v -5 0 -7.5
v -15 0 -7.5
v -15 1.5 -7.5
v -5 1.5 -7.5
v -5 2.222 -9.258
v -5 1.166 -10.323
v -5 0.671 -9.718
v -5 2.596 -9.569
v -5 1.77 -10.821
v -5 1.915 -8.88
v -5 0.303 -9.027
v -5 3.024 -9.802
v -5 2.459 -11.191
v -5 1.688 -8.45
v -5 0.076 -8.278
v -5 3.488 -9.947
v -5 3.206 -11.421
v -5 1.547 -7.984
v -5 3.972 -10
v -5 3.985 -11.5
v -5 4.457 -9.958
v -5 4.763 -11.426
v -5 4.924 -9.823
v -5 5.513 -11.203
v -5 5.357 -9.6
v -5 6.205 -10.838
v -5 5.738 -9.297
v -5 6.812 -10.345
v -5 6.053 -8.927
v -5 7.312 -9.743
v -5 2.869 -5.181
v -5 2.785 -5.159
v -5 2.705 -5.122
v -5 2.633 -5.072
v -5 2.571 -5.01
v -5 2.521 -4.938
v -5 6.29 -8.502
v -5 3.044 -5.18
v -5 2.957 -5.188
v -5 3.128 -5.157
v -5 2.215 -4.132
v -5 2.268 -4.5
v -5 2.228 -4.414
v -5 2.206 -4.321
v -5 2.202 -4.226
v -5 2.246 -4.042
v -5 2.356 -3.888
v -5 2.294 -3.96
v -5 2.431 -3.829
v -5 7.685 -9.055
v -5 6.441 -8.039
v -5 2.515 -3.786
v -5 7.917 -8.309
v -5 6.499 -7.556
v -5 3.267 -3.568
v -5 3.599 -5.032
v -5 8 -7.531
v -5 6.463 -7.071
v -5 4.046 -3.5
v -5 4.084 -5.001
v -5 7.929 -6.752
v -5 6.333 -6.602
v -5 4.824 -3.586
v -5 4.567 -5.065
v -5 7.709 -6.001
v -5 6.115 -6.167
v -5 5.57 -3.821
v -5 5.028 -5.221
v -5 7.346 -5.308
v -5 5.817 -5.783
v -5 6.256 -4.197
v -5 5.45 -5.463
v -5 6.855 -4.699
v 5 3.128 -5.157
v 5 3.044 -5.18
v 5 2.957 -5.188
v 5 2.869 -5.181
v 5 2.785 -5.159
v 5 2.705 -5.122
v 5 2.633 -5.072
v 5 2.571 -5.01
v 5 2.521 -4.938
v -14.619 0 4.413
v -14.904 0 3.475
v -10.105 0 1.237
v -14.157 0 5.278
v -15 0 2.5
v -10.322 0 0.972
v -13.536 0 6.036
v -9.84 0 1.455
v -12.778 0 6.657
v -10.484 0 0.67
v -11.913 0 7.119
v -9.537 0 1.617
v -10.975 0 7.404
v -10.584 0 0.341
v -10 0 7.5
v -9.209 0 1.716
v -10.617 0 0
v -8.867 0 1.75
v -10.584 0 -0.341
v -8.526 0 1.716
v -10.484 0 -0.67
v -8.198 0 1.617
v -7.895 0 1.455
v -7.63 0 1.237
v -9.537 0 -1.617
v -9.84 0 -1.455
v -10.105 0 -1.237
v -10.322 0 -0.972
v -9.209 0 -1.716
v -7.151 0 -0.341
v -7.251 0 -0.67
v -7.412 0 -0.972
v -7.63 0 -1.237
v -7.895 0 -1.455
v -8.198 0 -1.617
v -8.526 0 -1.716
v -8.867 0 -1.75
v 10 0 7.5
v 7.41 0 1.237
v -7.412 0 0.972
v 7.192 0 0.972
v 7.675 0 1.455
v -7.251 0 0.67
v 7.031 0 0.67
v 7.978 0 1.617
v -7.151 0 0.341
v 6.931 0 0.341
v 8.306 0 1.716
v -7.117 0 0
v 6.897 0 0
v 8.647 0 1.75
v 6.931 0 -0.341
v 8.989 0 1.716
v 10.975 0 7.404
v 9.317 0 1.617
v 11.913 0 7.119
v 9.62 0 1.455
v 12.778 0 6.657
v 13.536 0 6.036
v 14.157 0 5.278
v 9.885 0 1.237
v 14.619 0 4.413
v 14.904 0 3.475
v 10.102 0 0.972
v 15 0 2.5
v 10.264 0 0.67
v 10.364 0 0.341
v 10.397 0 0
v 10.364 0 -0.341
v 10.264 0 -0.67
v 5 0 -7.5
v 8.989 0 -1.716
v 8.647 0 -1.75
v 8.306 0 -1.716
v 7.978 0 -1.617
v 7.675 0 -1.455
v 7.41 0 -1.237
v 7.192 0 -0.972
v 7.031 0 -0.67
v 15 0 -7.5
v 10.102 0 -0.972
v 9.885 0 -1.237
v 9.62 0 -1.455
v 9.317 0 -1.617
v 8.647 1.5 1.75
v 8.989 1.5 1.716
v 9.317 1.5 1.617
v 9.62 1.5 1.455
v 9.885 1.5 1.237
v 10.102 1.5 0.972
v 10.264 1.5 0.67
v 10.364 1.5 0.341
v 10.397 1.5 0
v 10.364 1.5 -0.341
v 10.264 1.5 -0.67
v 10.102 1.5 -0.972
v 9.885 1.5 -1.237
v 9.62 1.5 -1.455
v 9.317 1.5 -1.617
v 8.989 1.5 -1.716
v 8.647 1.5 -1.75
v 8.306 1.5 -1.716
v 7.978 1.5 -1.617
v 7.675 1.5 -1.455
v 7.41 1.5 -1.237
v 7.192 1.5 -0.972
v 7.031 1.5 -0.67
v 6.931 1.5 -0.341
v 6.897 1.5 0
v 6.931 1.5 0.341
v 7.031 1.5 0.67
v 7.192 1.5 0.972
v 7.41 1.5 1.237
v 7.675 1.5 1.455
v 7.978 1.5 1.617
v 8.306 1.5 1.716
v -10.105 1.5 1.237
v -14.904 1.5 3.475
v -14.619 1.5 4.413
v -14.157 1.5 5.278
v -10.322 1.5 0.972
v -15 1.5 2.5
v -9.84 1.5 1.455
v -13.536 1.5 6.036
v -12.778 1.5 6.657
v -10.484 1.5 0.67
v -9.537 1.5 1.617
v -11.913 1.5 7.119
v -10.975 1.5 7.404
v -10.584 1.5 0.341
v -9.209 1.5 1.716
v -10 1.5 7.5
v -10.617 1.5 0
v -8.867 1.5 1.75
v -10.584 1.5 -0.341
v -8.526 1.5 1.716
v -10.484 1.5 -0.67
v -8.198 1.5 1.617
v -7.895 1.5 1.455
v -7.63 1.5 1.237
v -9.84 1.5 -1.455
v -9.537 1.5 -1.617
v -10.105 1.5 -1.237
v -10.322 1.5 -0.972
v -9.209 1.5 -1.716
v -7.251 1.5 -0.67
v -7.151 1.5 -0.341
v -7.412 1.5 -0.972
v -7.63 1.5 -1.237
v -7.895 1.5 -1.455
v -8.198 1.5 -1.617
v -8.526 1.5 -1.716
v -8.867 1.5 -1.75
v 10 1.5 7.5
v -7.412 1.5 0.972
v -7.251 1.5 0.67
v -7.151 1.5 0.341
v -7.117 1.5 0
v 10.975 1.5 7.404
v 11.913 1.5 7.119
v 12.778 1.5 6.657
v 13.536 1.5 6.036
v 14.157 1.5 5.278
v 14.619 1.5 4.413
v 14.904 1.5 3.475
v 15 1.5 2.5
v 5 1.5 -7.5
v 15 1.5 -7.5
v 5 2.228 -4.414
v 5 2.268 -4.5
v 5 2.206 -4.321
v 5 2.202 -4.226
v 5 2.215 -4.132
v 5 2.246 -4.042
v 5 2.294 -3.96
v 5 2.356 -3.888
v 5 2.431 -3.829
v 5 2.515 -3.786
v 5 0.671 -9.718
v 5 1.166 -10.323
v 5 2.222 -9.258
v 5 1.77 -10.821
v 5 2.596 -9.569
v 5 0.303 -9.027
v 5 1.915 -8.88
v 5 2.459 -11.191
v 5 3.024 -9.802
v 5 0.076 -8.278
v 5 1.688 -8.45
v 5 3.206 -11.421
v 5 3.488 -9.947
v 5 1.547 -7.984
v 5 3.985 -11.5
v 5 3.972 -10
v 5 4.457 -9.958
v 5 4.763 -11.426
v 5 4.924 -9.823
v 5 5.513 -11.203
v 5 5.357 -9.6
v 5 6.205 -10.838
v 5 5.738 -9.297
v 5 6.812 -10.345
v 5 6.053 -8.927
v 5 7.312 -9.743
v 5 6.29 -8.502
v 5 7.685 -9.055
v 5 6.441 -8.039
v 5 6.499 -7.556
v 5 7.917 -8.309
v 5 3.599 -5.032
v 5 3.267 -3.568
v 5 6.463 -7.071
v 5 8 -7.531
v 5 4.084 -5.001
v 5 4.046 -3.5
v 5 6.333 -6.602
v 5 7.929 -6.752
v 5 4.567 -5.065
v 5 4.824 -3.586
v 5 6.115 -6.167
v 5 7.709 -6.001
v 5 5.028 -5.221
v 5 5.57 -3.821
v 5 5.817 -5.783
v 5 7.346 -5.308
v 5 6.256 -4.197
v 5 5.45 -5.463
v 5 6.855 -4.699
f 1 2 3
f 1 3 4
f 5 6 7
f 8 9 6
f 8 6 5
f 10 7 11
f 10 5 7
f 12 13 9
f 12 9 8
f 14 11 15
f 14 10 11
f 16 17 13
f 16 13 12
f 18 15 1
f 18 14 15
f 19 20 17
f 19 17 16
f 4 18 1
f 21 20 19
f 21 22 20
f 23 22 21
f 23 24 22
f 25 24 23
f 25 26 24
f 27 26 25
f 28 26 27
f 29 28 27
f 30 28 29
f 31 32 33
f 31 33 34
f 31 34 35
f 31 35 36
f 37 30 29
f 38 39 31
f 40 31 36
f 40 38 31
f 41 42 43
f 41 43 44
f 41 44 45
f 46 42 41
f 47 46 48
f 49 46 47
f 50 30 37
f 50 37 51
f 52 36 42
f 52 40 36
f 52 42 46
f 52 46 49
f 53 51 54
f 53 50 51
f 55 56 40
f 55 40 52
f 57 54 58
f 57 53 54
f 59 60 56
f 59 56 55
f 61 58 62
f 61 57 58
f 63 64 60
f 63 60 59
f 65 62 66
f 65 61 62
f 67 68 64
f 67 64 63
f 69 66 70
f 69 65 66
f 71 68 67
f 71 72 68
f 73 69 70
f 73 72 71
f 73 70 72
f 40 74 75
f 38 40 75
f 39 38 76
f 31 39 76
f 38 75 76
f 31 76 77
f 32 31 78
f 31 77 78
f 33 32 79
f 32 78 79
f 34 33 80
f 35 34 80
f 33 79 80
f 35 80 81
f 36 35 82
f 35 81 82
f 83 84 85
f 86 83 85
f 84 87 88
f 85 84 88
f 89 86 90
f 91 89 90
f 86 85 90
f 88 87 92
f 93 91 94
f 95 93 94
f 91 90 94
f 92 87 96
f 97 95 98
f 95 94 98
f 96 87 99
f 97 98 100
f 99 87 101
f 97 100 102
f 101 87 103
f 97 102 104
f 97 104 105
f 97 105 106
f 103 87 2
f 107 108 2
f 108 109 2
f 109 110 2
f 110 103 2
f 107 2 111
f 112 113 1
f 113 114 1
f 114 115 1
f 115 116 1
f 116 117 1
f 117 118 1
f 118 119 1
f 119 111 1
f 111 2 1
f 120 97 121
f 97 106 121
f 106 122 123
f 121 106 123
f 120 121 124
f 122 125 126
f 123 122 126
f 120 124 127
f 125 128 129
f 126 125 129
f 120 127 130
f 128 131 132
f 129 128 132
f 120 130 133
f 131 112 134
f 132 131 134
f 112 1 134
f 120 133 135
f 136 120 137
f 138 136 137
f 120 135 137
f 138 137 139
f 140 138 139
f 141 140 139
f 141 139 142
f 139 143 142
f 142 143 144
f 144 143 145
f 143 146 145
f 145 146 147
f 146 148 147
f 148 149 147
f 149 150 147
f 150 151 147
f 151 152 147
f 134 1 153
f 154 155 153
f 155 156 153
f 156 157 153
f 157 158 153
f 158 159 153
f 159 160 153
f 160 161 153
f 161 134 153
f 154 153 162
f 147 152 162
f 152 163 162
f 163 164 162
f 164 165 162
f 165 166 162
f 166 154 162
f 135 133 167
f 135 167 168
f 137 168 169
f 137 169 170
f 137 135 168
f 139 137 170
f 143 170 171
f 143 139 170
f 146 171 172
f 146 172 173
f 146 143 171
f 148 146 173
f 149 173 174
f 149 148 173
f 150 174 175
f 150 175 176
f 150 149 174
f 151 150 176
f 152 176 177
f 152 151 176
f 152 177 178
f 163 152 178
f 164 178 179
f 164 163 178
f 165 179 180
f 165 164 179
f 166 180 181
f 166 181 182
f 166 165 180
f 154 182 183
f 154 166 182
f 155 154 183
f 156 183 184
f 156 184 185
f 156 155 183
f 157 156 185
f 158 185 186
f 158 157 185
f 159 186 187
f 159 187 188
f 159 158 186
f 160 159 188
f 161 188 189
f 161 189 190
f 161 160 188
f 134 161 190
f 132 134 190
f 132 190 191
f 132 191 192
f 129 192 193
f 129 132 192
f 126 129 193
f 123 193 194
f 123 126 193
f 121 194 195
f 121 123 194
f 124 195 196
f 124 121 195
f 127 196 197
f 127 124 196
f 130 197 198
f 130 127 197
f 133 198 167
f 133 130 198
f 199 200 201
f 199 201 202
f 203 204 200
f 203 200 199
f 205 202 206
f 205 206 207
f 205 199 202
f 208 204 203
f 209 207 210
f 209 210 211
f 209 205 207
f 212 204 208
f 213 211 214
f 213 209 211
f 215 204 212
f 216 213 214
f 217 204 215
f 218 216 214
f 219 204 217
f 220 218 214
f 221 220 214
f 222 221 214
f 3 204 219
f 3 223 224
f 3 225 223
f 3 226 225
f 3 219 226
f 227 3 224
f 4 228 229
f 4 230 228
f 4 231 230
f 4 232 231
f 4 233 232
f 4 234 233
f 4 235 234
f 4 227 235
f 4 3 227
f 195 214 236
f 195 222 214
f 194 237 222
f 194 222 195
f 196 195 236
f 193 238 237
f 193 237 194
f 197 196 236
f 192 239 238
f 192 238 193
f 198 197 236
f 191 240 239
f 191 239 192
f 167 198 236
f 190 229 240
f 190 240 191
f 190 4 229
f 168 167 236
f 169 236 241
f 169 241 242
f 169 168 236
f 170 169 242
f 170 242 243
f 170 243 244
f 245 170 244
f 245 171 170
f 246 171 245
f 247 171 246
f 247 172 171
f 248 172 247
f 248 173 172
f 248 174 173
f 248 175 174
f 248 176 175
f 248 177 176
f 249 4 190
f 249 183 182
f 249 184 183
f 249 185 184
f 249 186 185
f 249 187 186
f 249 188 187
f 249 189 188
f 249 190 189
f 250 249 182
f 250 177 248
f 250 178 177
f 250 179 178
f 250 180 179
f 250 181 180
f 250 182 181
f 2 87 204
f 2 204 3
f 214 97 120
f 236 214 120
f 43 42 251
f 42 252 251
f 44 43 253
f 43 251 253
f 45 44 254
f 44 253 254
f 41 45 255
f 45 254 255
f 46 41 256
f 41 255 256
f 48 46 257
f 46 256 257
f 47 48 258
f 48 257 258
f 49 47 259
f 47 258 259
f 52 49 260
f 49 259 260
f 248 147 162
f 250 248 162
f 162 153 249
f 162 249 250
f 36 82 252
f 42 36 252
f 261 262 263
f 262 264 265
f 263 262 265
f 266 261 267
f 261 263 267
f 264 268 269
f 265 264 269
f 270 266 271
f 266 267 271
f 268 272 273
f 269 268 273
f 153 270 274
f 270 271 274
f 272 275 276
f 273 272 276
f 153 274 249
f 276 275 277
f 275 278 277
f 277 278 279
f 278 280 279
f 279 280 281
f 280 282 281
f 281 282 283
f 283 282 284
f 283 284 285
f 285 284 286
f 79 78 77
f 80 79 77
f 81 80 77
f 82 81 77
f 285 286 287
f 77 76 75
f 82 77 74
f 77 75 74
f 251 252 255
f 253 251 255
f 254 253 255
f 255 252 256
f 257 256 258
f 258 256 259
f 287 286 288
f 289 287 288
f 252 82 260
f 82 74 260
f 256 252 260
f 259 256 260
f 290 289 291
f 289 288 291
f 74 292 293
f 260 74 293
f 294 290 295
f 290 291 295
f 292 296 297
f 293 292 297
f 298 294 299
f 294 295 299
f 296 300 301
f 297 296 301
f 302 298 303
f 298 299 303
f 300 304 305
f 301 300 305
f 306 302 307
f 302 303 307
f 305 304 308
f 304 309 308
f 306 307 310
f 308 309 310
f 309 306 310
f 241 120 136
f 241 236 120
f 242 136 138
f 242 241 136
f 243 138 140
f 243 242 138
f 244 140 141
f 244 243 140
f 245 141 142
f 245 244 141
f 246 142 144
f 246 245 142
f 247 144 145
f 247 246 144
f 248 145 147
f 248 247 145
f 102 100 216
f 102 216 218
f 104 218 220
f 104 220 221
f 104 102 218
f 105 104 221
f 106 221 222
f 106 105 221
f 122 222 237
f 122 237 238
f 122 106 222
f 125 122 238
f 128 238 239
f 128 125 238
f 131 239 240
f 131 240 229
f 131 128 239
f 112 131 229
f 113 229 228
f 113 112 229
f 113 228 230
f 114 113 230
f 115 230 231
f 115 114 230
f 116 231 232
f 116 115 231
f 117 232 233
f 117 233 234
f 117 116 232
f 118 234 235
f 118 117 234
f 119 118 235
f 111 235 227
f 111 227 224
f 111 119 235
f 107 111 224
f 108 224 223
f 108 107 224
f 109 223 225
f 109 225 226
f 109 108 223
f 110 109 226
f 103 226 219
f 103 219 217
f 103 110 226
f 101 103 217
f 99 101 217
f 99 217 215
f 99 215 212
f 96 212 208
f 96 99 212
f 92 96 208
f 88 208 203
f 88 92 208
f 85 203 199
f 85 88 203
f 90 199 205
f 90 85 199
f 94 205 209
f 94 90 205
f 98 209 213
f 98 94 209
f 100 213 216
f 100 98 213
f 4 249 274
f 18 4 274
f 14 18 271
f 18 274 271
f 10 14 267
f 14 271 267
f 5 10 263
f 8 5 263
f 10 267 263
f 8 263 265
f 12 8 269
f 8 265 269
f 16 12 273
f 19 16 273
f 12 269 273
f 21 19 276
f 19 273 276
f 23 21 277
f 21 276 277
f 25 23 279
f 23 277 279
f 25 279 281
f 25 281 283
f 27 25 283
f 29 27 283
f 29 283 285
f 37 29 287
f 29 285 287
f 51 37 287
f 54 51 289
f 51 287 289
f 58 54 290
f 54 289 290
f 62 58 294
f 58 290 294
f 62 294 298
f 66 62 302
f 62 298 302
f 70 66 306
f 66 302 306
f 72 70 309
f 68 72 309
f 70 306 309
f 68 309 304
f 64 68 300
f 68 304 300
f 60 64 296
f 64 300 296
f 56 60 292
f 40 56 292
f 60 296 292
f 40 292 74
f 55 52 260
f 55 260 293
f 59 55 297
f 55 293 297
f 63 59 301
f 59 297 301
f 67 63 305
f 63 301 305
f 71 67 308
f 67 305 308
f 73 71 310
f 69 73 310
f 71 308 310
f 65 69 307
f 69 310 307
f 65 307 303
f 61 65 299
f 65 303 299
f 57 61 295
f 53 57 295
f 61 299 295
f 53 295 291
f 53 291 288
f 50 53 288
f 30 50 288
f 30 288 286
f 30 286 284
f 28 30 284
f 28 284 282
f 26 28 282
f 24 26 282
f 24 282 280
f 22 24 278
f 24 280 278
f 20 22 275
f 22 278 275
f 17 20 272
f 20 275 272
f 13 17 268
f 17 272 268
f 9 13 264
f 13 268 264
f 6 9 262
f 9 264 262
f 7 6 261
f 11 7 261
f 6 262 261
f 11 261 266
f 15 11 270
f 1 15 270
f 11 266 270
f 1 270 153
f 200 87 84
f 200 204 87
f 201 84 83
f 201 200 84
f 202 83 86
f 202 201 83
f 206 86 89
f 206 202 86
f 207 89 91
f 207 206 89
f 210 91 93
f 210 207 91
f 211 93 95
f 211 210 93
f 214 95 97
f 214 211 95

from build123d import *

# Parameters (mm, degrees)
SKETCH_1_W      = 30
SKETCH_1_H      = 15
SKETCH_1_R      = 1.75
EXTRUDE_1_DEPTH = 1.5
FILLET_1_R      = 5
EXTRUDE_3_DEPTH = 5


with BuildPart() as part:
    # 草图1 → 凸台-拉伸1 (new body)
    with BuildSketch(Plane(origin=(0, 0, 0), x_dir=(1, 0, 0), z_dir=(0, 1, 0))):
        Rectangle(SKETCH_1_W, SKETCH_1_H)
        with Locations(Location((-8.867330988, 0, 0), (0, 0, 270))):
            Circle(SKETCH_1_R, mode=Mode.SUBTRACT)
        with Locations(Location((8.647397187, 0, 0), (0, 0, 270))):
            Circle(SKETCH_1_R, mode=Mode.SUBTRACT)
    extrude(amount=EXTRUDE_1_DEPTH)

    # 圆角1
    fillet_1_edges = [part.edges().sort_by_distance(p)[0] for p in [
        (15, 0.75, 7.5),
        (-15, 0.75, 7.5),
    ]]
    fillet(fillet_1_edges, radius=FILLET_1_R)

    # 草图2 → 凸台-拉伸3 (add, symmetric)
    with BuildSketch(Plane(origin=(0, 0, 0), x_dir=(0, 0, -1), z_dir=(1, 0, 0))):
        with BuildLine():
            Line((4.938262309, 2.520980054), (4.5, 2.267949192))
            ThreePointArc((4.5, 2.267949192), (4.086336582, 2.228506303), (3.785714286, 2.515385022))
            ThreePointArc((3.785714286, 2.515385022), (9.742937815, 7.311982783), (7.5, 0))
            Line((7.5, 0), (7.5, 1.5))
            ThreePointArc((7.5, 1.5), (8.926677651, 6.052946877), (5.156885257, 3.128327297))
            ThreePointArc((5.156885257, 3.128327297), (5.15871146, 2.784648148), (4.938262309, 2.520980054))
        make_face()
    extrude(amount=EXTRUDE_3_DEPTH, both=True)


solid = part.part
